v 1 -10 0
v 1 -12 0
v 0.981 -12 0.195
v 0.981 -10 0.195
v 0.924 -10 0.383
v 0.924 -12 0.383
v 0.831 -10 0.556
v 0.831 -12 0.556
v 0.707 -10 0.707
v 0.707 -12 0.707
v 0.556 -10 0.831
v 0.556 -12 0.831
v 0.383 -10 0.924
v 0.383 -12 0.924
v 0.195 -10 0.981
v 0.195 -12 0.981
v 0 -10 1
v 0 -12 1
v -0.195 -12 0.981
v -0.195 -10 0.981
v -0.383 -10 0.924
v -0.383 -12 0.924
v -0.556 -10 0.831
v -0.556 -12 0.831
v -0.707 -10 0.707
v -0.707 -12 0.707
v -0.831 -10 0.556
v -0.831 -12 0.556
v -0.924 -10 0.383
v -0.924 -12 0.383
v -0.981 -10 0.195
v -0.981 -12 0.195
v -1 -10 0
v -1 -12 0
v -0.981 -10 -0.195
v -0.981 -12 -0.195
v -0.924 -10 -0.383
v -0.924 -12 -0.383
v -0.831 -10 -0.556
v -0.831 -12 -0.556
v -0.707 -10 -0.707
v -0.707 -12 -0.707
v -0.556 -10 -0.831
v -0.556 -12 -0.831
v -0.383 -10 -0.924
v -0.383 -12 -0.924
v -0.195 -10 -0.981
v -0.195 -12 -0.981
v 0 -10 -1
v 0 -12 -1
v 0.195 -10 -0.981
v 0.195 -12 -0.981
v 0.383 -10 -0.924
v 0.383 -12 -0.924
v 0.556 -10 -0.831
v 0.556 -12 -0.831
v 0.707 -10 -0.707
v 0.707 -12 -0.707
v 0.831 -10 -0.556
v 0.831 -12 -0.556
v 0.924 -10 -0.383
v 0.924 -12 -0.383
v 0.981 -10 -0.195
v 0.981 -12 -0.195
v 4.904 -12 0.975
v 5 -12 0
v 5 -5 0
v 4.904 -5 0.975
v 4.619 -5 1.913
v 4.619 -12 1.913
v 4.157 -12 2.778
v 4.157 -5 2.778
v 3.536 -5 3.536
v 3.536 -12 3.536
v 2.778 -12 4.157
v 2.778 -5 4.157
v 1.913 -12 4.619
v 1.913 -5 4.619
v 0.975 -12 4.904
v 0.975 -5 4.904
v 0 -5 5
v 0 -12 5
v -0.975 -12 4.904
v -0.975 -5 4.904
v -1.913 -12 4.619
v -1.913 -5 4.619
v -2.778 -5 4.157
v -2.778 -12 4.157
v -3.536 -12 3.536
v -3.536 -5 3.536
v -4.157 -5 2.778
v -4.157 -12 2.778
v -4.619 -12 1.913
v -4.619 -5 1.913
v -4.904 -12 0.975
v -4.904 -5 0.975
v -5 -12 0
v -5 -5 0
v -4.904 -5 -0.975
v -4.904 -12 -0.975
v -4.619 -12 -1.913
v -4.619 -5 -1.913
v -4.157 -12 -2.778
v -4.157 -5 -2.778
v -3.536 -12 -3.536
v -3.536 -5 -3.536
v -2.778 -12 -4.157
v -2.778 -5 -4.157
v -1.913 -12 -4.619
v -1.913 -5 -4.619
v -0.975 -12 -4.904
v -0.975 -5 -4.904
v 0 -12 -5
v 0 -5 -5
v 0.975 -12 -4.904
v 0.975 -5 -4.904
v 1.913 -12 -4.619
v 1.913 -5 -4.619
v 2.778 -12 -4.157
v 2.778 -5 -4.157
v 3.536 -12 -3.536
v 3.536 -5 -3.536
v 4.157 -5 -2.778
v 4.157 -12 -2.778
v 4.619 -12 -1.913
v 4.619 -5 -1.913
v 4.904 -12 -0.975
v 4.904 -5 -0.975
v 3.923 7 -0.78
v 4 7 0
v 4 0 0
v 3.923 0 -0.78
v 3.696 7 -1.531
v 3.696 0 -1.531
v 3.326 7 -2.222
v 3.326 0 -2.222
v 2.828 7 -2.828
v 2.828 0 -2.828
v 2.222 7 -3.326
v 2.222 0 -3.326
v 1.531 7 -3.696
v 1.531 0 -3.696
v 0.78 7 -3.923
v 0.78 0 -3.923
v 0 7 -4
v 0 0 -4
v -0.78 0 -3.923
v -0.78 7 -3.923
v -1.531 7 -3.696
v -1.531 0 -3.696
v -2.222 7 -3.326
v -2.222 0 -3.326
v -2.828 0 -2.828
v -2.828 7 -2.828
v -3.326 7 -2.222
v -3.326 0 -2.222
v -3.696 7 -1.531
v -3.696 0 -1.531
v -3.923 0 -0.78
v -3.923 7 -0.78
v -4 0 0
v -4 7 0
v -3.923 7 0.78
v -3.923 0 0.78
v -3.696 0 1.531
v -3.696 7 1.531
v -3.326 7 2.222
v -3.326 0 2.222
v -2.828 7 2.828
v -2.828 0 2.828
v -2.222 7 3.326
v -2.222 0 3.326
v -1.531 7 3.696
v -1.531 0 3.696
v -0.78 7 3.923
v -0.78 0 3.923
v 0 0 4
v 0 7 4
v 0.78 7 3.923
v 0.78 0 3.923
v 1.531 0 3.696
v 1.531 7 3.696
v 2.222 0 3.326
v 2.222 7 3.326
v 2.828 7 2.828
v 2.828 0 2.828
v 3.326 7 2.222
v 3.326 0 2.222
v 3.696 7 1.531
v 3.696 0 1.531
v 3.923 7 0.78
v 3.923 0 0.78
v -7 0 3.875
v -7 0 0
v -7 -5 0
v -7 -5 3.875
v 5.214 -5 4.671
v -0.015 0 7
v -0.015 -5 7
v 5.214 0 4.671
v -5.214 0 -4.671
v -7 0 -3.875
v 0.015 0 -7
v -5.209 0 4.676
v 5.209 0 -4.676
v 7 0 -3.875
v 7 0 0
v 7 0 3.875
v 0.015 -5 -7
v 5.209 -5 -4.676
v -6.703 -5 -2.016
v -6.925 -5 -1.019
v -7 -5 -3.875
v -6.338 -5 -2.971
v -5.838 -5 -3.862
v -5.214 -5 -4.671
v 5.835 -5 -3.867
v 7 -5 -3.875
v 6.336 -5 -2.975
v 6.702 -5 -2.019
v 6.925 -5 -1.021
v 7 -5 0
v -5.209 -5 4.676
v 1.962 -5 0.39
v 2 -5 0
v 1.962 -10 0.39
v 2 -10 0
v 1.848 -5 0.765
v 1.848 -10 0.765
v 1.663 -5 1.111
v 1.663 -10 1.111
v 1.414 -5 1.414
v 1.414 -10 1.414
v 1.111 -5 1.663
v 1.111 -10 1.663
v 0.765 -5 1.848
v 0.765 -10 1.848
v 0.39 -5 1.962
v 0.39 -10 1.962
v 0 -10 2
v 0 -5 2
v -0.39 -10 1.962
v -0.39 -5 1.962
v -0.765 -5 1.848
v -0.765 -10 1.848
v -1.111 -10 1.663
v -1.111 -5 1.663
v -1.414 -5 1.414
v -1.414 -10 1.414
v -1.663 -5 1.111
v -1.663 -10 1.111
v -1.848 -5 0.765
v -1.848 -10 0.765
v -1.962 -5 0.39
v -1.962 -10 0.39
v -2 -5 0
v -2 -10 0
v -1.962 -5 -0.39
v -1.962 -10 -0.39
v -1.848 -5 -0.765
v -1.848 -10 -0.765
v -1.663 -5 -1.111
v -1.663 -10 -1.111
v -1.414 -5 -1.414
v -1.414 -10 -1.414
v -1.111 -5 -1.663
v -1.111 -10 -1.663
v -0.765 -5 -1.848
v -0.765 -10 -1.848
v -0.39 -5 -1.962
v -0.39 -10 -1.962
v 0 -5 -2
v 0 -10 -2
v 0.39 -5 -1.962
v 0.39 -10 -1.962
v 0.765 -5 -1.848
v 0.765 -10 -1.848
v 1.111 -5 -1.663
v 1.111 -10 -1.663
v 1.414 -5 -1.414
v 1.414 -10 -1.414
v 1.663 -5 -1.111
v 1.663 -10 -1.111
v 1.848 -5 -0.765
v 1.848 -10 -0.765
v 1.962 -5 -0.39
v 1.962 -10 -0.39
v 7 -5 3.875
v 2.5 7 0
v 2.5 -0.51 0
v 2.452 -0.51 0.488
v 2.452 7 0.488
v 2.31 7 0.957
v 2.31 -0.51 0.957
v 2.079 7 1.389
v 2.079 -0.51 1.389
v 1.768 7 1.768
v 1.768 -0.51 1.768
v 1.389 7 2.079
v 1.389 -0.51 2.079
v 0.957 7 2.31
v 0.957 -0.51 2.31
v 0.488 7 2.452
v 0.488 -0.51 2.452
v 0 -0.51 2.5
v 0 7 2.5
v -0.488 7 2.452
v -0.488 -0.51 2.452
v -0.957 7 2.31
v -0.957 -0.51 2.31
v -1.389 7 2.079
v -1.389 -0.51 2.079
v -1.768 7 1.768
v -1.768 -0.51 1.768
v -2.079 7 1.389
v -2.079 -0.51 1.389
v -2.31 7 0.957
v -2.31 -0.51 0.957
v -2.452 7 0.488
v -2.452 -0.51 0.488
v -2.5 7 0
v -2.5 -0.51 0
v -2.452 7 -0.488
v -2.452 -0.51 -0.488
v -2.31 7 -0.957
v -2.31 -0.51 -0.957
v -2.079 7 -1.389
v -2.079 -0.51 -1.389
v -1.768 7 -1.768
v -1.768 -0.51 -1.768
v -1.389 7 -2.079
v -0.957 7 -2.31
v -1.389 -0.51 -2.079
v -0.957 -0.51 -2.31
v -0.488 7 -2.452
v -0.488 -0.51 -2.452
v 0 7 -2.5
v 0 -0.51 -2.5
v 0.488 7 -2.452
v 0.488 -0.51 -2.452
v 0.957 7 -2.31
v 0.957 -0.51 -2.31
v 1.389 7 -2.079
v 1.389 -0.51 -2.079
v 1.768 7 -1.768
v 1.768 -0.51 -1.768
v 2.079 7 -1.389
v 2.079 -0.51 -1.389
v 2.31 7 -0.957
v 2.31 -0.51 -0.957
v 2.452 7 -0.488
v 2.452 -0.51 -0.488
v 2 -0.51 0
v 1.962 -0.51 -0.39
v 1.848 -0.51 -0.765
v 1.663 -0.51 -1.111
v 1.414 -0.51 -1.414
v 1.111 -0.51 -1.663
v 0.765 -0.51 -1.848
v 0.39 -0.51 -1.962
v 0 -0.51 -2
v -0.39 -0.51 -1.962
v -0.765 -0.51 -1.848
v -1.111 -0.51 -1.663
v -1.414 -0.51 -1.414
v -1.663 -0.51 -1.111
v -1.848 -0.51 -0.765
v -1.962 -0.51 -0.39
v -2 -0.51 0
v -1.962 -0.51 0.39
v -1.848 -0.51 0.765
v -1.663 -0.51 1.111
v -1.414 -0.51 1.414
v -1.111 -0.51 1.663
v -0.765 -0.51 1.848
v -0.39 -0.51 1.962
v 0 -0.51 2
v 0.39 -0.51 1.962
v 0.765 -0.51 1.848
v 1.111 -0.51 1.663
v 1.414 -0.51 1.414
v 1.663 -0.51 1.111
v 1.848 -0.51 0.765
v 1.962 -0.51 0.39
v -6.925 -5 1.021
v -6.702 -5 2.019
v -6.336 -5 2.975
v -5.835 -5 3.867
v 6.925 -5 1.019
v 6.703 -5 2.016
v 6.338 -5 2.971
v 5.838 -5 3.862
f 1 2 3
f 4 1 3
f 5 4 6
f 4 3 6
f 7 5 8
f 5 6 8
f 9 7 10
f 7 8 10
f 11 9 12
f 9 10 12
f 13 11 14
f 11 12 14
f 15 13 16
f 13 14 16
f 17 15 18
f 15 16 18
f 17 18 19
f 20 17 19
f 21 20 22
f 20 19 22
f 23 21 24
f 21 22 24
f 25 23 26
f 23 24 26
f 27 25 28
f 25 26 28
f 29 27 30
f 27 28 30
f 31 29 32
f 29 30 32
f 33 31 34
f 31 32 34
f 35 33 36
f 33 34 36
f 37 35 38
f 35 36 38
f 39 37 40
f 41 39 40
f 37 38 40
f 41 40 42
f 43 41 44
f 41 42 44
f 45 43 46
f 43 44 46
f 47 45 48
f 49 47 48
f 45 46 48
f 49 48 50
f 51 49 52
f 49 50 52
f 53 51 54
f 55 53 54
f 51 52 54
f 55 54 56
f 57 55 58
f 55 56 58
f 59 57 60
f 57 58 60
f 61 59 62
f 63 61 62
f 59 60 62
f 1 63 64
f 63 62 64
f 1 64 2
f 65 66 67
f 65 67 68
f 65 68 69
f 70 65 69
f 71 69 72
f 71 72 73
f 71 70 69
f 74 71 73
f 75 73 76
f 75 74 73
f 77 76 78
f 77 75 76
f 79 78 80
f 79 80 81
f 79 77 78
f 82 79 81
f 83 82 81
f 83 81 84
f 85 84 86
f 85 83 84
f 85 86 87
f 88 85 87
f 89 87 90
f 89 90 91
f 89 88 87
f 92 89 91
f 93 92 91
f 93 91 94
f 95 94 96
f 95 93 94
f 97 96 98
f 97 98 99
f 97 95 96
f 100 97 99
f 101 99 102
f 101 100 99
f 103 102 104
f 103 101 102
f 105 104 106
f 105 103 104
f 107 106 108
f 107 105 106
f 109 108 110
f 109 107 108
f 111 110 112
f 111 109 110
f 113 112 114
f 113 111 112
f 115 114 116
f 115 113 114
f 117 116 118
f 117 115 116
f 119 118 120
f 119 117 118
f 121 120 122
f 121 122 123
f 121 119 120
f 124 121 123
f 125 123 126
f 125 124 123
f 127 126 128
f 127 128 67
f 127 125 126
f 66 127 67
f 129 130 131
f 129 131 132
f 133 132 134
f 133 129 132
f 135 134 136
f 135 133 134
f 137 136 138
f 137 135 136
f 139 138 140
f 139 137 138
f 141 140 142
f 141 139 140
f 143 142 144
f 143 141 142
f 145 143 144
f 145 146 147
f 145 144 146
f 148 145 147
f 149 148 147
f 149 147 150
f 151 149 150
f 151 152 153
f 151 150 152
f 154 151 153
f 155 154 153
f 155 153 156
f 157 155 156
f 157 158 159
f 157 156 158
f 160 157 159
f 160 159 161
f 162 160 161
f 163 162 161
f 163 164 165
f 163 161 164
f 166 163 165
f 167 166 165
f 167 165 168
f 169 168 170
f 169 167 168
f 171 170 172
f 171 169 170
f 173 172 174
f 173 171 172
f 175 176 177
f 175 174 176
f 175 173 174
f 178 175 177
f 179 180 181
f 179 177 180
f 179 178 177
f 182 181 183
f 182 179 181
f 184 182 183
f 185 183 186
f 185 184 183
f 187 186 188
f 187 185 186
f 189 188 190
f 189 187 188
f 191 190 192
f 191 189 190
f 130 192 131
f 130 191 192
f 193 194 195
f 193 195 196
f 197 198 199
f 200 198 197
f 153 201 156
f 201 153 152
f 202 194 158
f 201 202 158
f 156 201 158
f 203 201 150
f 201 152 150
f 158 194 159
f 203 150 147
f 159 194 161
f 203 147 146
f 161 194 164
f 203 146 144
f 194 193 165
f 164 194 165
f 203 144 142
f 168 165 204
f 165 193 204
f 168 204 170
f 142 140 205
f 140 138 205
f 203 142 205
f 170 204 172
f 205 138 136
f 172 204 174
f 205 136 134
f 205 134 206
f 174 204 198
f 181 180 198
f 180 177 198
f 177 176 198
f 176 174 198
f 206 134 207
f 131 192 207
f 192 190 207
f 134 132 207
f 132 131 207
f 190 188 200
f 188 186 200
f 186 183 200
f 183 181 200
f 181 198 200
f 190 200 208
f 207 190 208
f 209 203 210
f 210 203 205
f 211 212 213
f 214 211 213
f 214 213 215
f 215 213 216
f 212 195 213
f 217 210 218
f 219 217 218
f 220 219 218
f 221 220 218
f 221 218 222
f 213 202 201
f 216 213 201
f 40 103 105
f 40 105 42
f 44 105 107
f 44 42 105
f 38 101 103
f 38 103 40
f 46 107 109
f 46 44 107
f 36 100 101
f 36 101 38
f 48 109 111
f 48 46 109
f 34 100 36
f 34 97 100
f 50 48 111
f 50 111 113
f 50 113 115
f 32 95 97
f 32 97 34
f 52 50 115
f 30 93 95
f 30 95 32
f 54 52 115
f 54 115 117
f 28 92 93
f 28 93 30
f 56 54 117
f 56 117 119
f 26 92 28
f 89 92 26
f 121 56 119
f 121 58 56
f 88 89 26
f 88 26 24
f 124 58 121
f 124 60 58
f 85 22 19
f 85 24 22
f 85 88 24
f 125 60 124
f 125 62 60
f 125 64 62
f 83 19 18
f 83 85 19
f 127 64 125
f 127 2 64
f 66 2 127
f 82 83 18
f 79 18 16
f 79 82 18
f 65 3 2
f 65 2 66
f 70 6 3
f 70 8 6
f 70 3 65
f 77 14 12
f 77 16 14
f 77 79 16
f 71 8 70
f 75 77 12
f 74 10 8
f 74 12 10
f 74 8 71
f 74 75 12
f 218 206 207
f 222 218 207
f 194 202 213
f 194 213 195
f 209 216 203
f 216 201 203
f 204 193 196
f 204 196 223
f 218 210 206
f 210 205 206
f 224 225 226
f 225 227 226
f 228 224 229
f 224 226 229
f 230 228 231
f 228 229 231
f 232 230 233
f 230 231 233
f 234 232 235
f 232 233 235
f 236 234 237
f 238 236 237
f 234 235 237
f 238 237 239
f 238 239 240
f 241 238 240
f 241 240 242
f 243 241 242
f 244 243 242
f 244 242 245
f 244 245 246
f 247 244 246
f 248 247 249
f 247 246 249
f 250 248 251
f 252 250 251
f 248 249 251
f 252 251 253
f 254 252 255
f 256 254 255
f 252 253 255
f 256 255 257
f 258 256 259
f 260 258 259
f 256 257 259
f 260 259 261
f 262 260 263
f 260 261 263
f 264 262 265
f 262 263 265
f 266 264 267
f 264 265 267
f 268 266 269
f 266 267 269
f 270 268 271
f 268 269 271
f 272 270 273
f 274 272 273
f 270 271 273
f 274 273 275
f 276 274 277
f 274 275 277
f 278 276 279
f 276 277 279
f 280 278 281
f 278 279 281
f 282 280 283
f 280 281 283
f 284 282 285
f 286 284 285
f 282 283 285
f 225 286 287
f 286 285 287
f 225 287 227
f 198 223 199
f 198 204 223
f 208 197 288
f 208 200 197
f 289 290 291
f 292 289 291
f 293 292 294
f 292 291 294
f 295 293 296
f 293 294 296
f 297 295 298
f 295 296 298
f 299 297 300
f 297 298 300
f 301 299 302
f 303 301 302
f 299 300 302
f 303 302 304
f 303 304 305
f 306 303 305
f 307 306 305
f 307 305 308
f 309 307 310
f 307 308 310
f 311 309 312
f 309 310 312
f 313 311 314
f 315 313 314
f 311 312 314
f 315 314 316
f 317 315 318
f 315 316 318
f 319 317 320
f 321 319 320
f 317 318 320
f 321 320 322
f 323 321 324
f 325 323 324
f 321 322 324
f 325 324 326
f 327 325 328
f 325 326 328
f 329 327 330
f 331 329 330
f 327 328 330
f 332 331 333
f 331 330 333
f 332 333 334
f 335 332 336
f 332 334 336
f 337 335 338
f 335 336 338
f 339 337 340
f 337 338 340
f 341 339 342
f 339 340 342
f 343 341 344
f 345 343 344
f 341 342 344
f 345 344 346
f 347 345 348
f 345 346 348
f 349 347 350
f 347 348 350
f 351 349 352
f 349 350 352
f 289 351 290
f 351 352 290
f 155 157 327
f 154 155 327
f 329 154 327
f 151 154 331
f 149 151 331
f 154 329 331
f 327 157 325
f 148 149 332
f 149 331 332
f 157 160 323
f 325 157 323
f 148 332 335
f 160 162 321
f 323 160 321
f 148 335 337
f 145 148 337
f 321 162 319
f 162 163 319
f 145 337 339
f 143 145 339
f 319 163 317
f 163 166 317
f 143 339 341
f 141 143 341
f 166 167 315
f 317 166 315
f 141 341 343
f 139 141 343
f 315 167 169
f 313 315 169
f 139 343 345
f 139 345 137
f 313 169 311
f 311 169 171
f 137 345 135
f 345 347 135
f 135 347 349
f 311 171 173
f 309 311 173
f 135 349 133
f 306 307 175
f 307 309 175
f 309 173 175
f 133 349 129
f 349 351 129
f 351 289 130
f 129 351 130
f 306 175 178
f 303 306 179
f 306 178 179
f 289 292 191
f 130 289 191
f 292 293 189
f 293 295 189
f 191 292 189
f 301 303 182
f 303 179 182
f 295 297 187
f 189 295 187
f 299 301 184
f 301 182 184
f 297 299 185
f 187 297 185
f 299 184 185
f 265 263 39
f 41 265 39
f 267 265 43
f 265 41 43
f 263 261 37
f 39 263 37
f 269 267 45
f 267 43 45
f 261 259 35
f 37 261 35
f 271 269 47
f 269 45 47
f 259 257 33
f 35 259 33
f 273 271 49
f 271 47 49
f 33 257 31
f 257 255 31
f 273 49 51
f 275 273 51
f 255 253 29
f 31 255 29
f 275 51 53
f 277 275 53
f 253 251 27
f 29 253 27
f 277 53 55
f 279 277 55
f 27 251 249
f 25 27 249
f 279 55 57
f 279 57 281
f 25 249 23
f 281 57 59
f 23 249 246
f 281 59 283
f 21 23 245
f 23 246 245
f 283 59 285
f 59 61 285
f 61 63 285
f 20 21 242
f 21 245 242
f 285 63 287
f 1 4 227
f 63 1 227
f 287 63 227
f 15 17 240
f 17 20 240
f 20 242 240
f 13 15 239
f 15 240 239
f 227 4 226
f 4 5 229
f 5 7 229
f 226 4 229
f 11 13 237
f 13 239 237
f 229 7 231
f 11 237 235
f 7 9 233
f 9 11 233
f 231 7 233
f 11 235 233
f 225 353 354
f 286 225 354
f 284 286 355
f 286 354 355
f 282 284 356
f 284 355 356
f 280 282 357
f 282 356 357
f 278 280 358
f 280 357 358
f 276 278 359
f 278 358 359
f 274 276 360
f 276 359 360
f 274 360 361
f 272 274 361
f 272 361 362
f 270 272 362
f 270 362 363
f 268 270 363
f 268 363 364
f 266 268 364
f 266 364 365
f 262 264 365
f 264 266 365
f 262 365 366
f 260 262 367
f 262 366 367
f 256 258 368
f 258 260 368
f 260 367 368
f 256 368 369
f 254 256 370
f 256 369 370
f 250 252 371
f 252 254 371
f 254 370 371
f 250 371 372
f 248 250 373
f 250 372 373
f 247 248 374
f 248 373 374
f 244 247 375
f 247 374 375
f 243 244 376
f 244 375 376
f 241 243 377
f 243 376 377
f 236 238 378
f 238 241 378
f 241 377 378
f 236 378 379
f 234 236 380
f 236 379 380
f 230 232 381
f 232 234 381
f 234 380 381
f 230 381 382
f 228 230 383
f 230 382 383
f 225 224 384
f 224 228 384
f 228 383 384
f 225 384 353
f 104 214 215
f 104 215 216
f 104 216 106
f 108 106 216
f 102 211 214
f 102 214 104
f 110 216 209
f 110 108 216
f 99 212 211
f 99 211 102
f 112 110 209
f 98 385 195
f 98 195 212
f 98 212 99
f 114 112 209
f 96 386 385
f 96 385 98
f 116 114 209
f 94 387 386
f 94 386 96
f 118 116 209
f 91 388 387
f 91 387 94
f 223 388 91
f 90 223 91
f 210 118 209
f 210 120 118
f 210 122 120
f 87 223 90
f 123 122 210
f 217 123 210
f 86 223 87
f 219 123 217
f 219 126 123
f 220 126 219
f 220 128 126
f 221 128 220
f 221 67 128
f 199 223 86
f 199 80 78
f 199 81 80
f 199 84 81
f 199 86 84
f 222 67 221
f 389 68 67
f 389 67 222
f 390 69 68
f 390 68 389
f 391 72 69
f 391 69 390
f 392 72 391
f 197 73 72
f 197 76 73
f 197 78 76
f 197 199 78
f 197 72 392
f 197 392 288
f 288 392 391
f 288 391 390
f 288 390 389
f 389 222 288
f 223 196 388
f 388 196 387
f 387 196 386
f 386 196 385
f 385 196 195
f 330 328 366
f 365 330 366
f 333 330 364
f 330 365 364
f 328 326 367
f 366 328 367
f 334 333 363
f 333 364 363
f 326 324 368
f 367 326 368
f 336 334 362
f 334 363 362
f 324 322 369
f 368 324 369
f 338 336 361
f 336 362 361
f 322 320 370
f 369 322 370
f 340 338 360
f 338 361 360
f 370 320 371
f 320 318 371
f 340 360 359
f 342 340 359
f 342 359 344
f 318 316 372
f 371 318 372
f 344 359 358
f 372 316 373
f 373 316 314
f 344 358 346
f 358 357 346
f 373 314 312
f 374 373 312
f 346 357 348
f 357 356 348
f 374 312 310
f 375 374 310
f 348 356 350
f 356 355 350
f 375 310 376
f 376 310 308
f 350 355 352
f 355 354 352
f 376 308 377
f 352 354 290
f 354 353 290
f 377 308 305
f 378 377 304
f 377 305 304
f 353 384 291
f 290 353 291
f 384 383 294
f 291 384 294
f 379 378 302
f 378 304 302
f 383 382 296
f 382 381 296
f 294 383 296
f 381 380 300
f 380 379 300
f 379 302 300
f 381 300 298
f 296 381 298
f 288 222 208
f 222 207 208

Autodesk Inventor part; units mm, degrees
ref_plane "YZ Plane" through (0, 0, 0) normal (1, 0, 0) x (0, 1, 0)
ref_plane "XZ Plane" through (0, 0, 0) normal (0, 1, 0) x (-1, 0, 0)
ref_plane "XY Plane" through (0, 0, 0) normal (0, 0, 1) x (1, 0, 0)
sketch "Boceto1" plane through (0, 0, 0) normal (0, 0, 1) x (1, 0, 0)
  line L0 (0, 9.3809) -> (0, -9.3809)
  line L1 (-19.2892, 0) -> (19.2892, 0) construction
  line L2 (0, 7) -> (4, 7)
  line L3 (4, 0) -> (4, 7)
  line L4 (4, 0) -> (7, 0)
  line L5 (7, 0) -> (7, -5)
  line L6 (7, -5) -> (0, -5)
  line L7 (5, -5) -> (5, -12)
  line L8 (5, -12) -> (0, -12)
  line L9 (2.5, 7) -> (2.5, 0)
  line L10 (2, -5) -> (2, -10)
  line L11 (2.5, 0) -> (2.5, -0.5101)
  line L12 (2.5, -0.5101) -> (2, -0.5101)
  line L13 (2, -5) -> (2, -0.5101)
  line L14 (2, -10) -> (1, -10)
  line L15 (1, -10) -> (1, -12)
  point P0 (0, 0)
  point P1 (0, 0)
  dimension "d0" = 14
  dimension "d1" = 10
  dimension "d2" = 8
  dimension "d3" = 5
  dimension "d4" = 4
  dimension "d5" = 2
  dimension "d6" = 2
  dimension "d7" = 7
  dimension "d8" = 5
  dimension "d9" = 7
revolve "Revolución1" add sketch "Boceto1" angle 360 about axis through (0, 9.3809, 0) along (0, -1, 0) contours L2 L3 L4 L5 L6 L13 L12 L11 L9 | L6 L7 L8 L15 L14 L10
sketch "Boceto2" plane through (0, 0, 0) normal (0, 1, 0) x (1, 0, 0)
  circle A0 centre (0, 0) radius 2.5 projected
  circle A1 centre (0, 0) radius 4 projected
  circle A2 centre (0, 0) radius 4 projected
  circle A3 centre (0, 0) radius 7 projected
  line L0 (7, 3.875) -> (7, -3.875)
  line L1 (-7, 3.875) -> (-7, -3.875)
  circle A4 centre (0, 0) radius 7 projected
  line L2 (-7, 3.875) -> (0.0154, 7)
  line L3 (0.0154, 7) -> (7, 3.875)
  line L4 (-7, -3.875) -> (-0.0154, -7)
  line L5 (-0.0154, -7) -> (7, -3.875)
  arc A5 (0.0154, 7) -> (-5.214, 4.6706) centre (0, 0) ccw
  circle A6 centre (0, 0) radius 7 projected
  arc A7 (5.2088, 4.6764) -> (0.0154, 7) centre (0, 0) ccw
  arc A8 (-0.0154, -7) -> (5.214, -4.6706) centre (0, 0) ccw
  arc A9 (-5.2088, -4.6764) -> (-0.0154, -7) centre (0, 0) ccw
  point P0 (0, 0)
  point P1 (7, 0)
  point P2 (-7, 0)
  point P3 (-0.0154, -7)
  point P4 (-0.0154, -7)
  point P5 (-5.2088, -4.6764)
  point P6 (5.214, -4.6706)
  point P7 (5.2088, 4.6764)
  point P8 (-5.214, 4.6706)
  dimension "d15" = 14
  dimension "d27" = 7.75
  dimension "d28" = 14
  dimension "d29" = 14
  dimension "d30" = 7.75
  dimension "d51" = 7
  dimension "d52" = 1.786
  dimension "d53" = 1.7913
  dimension "d54" = 7.0154
  dimension "d55" = 7.0154
  dimension "d56" = 12.7918
  dimension "d57" = 12.2088
  dimension "d58" = 12.7918
  dimension "d59" = 12.214
  dimension "d60" = 4.2619
  dimension "d61" = 7
  dimension "d62" = 7
  dimension "d63" = 7
extrude "Extrusión1" cut sketch "Boceto2" against normal through all contours L3 A3 | A3 L5 | L2 A3 | A3 L4
extrude "Extrusión2" add sketch "Boceto2" against normal blind 5 contours L0 L5 A3 | A3 L3 L0 | A3 L1 L2 | L4 L1 A3
thread "Rosca2" size "M10x1.5" class "6g" standard "ANSI Metric M Profile" length 7
thread "Rosca3" size "M8x0.75" class "6g" standard "ANSI Metric M Profile" length 7
equation "\"d30\" = d27"
properties part number "1-HUDSON-8-29-TDR HAND PUMP BODY TOP OUTLET"
